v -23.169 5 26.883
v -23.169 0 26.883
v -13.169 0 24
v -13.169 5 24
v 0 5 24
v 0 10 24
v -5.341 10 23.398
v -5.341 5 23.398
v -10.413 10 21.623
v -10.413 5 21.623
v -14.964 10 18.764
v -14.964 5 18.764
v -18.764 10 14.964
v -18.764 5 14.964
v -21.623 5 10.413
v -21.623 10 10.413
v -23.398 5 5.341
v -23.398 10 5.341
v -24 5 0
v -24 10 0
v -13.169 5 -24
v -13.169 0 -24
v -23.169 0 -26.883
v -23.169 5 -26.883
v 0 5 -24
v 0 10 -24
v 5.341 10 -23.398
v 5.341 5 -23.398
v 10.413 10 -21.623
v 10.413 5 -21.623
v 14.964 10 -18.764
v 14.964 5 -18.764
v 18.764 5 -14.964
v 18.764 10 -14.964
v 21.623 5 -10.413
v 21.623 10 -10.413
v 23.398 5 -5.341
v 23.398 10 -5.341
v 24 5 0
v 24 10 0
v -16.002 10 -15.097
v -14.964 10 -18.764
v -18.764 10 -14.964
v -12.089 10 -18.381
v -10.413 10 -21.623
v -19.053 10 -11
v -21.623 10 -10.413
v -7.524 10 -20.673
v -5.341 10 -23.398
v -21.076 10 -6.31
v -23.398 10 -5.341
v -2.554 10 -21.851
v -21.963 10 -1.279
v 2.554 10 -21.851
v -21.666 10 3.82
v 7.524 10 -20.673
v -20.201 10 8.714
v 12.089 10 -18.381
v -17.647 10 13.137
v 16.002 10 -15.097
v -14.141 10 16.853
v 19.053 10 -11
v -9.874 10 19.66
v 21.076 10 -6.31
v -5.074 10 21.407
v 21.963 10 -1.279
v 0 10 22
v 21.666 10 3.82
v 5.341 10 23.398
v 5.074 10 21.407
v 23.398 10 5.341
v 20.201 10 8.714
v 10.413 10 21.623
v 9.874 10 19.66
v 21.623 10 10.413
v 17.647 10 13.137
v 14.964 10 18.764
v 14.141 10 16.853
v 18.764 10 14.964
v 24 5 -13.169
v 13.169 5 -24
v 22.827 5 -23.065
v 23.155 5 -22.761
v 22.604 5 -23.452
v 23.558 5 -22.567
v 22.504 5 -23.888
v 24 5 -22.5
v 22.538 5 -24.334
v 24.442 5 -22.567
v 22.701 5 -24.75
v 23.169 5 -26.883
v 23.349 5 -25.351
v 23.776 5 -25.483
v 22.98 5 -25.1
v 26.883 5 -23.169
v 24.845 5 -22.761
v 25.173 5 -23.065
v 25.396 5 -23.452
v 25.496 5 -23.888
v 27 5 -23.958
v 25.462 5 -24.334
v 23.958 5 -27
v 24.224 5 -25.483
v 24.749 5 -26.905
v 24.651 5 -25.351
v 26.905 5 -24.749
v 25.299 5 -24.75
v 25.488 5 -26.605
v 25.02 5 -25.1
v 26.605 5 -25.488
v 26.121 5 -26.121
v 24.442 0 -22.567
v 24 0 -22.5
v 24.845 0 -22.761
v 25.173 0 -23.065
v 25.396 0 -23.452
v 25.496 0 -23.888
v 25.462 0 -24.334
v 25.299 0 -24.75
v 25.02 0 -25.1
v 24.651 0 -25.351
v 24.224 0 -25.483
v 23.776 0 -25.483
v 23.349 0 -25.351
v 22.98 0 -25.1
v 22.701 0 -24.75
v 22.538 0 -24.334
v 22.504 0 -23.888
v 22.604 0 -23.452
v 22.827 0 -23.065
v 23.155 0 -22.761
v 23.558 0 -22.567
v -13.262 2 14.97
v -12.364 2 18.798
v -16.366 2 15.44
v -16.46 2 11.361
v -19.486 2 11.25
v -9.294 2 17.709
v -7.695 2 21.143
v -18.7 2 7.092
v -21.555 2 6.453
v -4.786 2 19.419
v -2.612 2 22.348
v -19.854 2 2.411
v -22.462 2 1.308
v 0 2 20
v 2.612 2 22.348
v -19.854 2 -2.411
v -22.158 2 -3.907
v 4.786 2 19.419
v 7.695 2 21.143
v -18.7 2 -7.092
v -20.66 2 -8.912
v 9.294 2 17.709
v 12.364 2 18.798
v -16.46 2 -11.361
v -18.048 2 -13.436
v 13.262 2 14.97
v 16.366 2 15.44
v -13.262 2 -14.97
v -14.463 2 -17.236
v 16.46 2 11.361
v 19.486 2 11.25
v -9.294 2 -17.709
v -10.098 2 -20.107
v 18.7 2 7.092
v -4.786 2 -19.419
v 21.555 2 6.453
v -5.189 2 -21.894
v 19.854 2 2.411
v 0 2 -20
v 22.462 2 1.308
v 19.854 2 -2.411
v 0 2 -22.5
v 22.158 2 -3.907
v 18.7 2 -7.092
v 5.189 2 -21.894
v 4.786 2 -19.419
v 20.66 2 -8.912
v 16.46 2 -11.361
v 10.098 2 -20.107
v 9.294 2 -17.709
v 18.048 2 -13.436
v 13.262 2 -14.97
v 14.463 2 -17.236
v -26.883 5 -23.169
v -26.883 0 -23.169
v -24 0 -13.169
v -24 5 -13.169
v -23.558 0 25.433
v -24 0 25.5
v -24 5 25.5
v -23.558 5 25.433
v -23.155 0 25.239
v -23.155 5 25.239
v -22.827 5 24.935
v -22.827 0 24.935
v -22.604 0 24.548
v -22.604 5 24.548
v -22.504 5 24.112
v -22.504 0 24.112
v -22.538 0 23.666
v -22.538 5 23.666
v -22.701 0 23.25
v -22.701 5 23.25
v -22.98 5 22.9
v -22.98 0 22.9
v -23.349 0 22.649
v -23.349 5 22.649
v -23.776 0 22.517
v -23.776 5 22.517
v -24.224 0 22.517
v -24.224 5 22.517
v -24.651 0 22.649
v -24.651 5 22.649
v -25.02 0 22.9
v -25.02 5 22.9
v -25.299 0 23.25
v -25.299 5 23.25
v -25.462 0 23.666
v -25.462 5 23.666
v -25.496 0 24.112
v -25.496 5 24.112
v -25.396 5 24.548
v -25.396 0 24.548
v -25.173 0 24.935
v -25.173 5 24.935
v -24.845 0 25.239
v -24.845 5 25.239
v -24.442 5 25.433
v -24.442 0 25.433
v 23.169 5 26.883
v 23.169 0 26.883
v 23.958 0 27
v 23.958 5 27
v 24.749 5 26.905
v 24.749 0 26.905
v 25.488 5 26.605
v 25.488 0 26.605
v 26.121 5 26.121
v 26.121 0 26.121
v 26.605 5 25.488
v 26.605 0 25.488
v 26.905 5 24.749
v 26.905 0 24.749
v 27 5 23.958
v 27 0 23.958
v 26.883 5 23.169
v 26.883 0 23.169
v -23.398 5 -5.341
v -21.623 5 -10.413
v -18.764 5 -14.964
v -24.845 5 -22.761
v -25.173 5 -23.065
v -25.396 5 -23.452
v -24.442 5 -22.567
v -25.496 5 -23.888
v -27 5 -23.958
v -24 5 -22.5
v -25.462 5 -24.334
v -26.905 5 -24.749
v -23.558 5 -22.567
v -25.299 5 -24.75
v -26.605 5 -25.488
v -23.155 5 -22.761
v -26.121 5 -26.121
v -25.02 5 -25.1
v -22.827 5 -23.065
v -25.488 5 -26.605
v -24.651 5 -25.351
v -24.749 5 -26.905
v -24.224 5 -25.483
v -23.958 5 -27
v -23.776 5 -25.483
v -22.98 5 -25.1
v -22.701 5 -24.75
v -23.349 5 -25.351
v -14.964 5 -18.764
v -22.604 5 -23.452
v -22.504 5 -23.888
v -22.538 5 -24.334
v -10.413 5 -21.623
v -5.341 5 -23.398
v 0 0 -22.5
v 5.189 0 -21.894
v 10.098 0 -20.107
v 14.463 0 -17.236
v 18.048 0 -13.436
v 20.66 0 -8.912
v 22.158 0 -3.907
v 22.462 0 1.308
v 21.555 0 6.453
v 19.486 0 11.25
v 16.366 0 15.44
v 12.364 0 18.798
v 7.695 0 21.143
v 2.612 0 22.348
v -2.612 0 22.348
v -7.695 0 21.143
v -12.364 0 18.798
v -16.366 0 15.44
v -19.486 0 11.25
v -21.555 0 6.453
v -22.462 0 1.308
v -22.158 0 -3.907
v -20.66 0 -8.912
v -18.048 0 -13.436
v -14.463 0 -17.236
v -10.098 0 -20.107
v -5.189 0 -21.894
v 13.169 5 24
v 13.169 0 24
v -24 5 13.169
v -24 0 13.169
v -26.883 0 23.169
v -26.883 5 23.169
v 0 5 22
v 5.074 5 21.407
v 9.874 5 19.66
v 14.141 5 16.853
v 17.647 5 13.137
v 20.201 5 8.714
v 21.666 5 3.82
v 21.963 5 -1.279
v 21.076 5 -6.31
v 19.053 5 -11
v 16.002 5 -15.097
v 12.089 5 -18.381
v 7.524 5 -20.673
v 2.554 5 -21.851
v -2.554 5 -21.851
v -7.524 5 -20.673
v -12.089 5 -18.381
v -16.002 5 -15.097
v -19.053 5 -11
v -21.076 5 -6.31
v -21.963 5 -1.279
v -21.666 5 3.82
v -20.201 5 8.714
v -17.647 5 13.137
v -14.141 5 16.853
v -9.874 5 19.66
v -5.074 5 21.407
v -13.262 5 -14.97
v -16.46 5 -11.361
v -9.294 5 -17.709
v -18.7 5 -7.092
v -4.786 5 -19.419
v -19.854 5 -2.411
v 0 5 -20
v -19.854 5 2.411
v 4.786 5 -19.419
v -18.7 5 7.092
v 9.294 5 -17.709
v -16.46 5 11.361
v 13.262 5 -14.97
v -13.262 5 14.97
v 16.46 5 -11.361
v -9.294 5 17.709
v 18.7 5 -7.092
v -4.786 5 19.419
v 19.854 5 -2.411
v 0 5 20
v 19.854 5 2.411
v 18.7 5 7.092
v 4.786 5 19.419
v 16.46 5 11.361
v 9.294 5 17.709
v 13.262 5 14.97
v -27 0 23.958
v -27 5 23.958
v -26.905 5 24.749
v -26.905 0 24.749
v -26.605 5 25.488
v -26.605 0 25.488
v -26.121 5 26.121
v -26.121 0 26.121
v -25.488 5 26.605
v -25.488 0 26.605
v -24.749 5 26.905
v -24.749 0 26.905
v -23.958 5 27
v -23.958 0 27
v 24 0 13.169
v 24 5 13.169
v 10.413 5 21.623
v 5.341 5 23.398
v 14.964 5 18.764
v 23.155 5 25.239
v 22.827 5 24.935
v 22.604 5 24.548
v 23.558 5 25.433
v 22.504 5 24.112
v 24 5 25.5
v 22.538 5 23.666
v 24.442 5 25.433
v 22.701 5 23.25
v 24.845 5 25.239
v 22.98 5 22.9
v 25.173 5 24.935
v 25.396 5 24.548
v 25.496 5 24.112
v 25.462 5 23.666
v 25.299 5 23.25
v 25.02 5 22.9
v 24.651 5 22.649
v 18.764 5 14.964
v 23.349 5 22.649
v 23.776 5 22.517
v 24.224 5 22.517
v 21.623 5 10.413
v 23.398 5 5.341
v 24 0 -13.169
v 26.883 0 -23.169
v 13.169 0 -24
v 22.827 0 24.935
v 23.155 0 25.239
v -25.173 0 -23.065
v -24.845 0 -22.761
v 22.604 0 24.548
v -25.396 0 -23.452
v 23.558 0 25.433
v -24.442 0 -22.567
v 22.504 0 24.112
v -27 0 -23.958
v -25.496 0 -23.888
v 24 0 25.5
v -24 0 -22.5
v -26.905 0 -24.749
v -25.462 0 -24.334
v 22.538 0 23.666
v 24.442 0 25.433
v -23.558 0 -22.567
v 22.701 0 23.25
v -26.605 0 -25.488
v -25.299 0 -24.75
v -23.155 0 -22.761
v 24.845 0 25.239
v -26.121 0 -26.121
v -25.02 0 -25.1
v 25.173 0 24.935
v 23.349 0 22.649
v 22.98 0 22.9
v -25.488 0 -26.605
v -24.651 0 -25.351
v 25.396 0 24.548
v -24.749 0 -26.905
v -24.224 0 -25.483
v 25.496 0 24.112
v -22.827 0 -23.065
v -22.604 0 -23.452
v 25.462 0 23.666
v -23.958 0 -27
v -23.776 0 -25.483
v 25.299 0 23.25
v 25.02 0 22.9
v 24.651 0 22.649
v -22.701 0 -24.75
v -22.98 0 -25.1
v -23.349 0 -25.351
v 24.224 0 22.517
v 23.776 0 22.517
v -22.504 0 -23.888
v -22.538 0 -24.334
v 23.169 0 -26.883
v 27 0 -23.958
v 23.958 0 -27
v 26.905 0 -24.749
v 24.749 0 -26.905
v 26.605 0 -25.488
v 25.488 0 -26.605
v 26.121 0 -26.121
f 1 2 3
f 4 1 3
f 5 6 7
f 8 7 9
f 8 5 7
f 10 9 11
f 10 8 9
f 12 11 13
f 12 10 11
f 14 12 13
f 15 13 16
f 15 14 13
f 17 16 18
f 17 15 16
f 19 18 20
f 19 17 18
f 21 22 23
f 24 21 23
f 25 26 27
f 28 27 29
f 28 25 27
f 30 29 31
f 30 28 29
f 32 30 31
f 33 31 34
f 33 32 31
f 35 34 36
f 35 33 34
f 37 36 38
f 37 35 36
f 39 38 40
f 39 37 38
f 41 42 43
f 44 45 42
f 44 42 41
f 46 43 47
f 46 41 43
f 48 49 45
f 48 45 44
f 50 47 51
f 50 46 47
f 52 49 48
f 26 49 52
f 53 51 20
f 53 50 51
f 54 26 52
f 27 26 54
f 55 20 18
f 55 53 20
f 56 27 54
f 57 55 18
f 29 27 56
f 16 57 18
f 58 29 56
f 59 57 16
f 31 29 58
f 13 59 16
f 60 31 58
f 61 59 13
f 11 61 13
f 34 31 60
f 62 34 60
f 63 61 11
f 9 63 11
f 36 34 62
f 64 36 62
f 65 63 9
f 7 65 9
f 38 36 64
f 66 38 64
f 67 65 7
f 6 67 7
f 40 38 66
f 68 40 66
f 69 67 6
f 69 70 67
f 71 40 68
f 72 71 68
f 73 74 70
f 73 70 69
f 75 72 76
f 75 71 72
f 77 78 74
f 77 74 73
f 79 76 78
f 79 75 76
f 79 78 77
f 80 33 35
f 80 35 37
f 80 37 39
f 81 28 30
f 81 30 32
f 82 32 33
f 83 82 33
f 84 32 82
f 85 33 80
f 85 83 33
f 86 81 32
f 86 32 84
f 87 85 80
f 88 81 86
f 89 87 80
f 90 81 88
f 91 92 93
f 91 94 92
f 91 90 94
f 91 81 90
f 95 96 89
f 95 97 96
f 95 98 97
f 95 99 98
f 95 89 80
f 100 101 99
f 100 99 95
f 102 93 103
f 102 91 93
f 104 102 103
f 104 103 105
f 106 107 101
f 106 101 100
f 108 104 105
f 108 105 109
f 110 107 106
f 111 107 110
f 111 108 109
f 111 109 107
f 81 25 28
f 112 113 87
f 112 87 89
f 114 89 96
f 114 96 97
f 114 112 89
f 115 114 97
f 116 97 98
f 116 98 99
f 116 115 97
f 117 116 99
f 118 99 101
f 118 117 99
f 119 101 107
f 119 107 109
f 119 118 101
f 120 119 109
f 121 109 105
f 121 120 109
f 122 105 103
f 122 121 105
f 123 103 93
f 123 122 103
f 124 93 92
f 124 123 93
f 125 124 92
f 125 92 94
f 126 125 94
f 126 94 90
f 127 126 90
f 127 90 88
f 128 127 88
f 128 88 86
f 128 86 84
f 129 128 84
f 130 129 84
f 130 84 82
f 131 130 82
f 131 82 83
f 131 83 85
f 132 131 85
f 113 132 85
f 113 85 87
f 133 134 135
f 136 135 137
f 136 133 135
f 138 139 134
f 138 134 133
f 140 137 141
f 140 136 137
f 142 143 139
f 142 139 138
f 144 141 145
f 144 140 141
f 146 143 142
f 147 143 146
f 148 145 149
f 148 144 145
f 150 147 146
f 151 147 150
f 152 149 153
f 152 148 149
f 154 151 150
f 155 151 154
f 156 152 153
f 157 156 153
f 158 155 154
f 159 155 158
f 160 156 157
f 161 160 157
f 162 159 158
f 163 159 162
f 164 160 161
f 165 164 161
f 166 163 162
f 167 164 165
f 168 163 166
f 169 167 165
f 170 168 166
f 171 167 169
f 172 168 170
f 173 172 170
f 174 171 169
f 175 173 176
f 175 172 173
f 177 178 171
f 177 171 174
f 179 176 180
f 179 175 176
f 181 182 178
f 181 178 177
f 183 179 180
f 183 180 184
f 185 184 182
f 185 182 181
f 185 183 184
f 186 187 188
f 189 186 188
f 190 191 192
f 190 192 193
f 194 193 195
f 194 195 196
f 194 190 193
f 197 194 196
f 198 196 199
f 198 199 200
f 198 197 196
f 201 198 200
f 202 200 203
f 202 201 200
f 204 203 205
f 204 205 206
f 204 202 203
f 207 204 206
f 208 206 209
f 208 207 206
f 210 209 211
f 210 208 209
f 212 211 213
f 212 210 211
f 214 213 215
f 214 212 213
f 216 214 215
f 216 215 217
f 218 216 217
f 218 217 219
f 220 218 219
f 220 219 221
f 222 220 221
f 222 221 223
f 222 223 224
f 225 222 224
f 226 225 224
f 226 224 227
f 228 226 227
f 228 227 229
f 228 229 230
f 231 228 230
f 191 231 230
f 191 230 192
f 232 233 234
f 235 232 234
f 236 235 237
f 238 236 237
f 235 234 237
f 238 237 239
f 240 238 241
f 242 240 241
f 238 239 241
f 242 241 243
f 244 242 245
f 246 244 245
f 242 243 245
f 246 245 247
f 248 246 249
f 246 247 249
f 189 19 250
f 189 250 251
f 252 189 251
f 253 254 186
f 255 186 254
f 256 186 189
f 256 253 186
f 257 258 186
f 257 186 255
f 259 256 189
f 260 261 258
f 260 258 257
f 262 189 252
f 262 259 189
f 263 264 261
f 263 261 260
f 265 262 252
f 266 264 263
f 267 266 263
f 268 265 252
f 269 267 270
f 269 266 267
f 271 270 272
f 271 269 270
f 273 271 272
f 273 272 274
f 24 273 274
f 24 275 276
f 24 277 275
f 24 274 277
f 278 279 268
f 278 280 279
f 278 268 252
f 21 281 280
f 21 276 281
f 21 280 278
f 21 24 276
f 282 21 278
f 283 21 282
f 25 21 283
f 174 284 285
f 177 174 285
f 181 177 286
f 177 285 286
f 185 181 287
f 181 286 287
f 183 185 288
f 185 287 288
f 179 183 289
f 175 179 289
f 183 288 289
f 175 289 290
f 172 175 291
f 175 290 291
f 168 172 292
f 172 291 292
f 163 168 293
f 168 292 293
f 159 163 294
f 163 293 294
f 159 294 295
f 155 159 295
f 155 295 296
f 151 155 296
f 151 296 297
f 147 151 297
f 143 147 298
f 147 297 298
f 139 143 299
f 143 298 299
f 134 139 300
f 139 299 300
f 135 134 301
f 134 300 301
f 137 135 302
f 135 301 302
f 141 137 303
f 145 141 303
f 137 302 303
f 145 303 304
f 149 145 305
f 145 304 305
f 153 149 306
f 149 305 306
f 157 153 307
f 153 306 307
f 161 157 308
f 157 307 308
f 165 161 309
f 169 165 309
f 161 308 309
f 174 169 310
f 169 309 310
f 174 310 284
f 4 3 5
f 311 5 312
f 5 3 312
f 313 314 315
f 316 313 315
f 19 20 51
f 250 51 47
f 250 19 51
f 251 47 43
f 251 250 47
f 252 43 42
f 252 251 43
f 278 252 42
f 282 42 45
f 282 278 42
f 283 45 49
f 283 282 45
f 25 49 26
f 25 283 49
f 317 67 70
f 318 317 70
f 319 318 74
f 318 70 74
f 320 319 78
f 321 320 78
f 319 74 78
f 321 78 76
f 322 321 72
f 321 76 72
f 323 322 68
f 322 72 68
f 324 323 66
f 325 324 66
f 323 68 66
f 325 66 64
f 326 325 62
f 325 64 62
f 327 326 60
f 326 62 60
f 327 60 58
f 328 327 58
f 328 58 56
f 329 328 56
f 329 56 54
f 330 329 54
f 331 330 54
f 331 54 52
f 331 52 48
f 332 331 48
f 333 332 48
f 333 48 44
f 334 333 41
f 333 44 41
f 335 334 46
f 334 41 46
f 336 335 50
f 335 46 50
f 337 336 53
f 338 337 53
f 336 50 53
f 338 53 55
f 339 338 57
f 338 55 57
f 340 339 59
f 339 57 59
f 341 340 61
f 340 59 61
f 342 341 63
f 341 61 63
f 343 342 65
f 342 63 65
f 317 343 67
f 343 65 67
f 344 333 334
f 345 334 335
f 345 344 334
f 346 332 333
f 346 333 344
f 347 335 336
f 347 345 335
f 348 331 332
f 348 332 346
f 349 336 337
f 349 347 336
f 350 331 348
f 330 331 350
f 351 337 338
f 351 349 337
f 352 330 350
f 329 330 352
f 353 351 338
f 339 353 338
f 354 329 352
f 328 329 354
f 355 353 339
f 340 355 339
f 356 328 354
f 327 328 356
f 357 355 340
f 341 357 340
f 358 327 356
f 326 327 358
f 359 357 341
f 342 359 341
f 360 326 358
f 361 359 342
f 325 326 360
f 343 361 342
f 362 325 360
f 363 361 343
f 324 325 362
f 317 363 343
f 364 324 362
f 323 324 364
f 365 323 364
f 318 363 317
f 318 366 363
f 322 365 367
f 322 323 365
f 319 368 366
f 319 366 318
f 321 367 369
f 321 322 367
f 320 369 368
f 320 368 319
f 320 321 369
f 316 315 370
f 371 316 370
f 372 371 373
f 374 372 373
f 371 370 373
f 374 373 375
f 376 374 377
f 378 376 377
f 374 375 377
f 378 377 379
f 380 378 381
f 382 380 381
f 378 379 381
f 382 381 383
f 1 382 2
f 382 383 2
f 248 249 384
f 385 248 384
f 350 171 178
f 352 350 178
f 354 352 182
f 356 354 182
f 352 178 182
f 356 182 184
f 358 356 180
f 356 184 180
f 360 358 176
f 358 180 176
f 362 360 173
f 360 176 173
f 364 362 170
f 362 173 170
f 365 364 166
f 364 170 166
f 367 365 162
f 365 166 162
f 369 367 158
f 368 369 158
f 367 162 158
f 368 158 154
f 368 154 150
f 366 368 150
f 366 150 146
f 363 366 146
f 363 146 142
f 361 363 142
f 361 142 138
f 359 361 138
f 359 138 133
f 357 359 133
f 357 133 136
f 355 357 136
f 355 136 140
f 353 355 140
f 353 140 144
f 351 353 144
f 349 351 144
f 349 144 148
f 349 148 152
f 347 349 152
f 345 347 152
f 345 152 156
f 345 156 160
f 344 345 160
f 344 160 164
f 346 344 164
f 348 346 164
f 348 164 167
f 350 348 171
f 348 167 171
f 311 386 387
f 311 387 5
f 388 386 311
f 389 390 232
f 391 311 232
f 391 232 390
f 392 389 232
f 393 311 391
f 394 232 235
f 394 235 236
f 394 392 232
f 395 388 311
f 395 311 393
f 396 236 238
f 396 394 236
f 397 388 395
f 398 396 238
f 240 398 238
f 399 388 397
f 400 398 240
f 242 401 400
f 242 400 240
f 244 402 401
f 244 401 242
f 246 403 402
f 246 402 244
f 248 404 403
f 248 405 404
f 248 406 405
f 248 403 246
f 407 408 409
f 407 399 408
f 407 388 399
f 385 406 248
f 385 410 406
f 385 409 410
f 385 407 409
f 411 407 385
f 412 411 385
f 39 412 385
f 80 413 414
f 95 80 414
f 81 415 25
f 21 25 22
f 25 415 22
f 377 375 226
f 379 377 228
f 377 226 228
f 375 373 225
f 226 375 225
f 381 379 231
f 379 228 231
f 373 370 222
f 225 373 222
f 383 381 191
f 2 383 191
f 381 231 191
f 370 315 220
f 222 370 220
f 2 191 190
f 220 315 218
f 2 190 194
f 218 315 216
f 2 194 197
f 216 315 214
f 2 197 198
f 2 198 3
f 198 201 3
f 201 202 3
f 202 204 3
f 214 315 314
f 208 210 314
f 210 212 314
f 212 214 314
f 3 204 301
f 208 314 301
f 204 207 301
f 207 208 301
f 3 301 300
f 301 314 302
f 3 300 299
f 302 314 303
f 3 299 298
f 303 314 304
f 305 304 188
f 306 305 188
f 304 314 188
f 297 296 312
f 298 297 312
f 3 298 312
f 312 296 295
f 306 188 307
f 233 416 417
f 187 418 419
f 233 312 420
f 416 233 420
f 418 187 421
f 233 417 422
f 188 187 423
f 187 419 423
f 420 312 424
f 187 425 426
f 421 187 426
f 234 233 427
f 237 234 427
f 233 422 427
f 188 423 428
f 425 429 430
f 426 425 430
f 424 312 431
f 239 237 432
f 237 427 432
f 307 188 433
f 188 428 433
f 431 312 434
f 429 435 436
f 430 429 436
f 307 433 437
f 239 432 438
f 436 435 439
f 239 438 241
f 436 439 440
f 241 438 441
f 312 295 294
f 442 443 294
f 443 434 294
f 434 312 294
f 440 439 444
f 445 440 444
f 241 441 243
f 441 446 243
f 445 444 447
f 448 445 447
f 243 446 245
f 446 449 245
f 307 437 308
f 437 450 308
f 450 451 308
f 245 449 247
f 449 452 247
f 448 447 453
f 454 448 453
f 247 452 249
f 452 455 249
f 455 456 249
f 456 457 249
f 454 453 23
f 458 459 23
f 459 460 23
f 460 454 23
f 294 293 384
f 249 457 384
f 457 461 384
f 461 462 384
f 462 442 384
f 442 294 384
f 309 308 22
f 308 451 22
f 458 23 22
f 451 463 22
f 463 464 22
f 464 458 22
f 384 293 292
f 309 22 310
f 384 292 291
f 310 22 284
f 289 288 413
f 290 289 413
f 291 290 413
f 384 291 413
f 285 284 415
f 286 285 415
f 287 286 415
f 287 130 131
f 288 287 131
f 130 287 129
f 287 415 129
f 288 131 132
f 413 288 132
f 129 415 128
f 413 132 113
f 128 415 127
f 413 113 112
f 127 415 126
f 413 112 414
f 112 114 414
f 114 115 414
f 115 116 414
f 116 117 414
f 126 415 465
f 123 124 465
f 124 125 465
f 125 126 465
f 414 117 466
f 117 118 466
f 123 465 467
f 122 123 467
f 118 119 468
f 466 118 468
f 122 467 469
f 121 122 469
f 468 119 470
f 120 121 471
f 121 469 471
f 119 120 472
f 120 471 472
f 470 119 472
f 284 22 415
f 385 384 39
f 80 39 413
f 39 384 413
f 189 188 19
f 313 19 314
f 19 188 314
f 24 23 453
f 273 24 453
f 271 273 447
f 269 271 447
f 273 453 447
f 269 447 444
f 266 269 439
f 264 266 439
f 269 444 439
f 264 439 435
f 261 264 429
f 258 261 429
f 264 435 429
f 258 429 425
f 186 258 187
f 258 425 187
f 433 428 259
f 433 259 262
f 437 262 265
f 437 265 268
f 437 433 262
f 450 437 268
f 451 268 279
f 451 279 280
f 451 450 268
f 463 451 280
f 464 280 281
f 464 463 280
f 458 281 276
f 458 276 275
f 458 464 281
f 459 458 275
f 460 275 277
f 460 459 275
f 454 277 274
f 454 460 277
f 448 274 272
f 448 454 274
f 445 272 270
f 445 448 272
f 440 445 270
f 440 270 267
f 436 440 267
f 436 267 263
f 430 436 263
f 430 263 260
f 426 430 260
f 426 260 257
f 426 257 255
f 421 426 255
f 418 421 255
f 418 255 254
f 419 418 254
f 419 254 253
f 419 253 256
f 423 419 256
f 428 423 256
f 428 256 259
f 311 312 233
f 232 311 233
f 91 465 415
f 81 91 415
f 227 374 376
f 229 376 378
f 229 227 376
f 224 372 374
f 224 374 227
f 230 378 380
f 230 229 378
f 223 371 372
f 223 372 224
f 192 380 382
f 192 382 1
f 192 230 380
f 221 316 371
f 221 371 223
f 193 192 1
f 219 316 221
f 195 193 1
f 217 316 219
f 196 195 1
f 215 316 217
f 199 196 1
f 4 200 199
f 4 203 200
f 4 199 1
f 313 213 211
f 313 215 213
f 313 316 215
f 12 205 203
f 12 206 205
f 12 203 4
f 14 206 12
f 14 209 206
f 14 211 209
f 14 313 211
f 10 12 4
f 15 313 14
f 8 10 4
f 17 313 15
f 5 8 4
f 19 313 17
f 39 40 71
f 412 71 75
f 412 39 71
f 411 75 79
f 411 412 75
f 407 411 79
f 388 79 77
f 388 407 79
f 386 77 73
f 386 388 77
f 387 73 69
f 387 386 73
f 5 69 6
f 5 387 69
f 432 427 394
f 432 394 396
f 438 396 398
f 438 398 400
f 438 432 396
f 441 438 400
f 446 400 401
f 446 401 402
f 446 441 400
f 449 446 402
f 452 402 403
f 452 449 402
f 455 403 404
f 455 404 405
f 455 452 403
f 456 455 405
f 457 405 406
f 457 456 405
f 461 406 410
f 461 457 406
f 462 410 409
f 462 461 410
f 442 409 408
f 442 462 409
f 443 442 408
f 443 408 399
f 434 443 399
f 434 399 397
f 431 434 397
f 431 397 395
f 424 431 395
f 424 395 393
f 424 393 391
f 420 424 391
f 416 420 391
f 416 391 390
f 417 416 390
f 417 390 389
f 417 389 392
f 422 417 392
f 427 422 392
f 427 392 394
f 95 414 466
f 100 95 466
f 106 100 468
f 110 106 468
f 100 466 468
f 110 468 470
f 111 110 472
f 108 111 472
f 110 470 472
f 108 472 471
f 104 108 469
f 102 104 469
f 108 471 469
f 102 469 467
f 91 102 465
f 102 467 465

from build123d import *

# Parameters (mm, degrees)
SKETCH1_R           = 1.5
BOSS_EXTRUDE1_DEPTH = 25
SKETCH2_R           = 20
CUT_EXTRUDE1_DEPTH  = 23
CUT_EXTRUDE2_START  = -20
SKETCH3_R           = 1.5
CUT_EXTRUDE2_DEPTH  = 20
FILLET2_R           = 3
SKETCH4_R           = 22.5
SKETCH4_R_2         = 20
CUT_EXTRUDE3_DEPTH  = 2
CUT_EXTRUDE4_START  = -15
SKETCH5_R           = 24
CUT_EXTRUDE4_DEPTH  = 15
SKETCH6_R           = 22
CUT_EXTRUDE5_DEPTH  = 5


with BuildPart() as part:
    # Sketch1 → Boss-Extrude1 (new body)
    with BuildSketch(Plane(origin=(0, 0, 0), x_dir=(1, 0, 0), z_dir=(0, 1, 0))):
        with BuildLine():
            Line((13.169048105, 24), (-13.169048105, 24))
            Line((-13.169048105, 24), (-23.169048105, 26.882623622))
            ThreePointArc((-23.169048105, 26.882623622), (-26.121320344, 26.121320344), (-26.882623622, 23.169048105))
            Line((-26.882623622, 23.169048105), (-24, 13.169048105))
            Line((-24, 13.169048105), (-24, -13.169048105))
            Line((-24, -13.169048105), (-26.882623622, -23.169048105))
            ThreePointArc((-26.882623622, -23.169048105), (-26.121320344, -26.121320344), (-23.169048105, -26.882623622))
            Line((-23.169048105, -26.882623622), (-13.169048105, -24))
            Line((-13.169048105, -24), (13.169048105, -24))
            Line((13.169048105, -24), (23.169048105, -26.882623622))
            ThreePointArc((23.169048105, -26.882623622), (26.121320344, -26.121320344), (26.882623622, -23.169048105))
            Line((26.882623622, -23.169048105), (24, -13.169048105))
            Line((24, -13.169048105), (24, 13.169048105))
            Line((24, 13.169048105), (26.882623622, 23.169048105))
            ThreePointArc((26.882623622, 23.169048105), (26.121320344, 26.121320344), (23.169048105, 26.882623622))
            Line((23.169048105, 26.882623622), (13.169048105, 24))
        make_face()
        with Locations(Location((24, 24, 0), (0, 0, 270))):
            Circle(SKETCH1_R, mode=Mode.SUBTRACT)
        with Locations(Location((-24, -24, 0), (0, 0, 270))):
            Circle(SKETCH1_R, mode=Mode.SUBTRACT)
        with Locations(Location((24, -24, 0), (0, 0, 270))):
            Circle(SKETCH1_R, mode=Mode.SUBTRACT)
        with Locations(Location((-24, 24, 0), (0, 0, 270))):
            Circle(SKETCH1_R, mode=Mode.SUBTRACT)
    extrude(amount=BOSS_EXTRUDE1_DEPTH)

    # Sketch2 → Cut-Extrude1 (cut)
    with BuildSketch(Plane.XZ):
        with Locations(Location((0, 0, 0), (0, 0, 270))):
            Circle(SKETCH2_R)
    extrude(amount=-CUT_EXTRUDE1_DEPTH, mode=Mode.SUBTRACT)

    # Sketch3 → Cut-Extrude2 (cut)
    # profile 1 of 4: a face of its own
    with BuildSketch(Plane(origin=(0, 25, 0), x_dir=(1, 0, 0), z_dir=(0, 1, 0)).offset(CUT_EXTRUDE2_START)):
        with BuildLine():
            ThreePointArc((-24, 0), (-16.970562748, 16.970562748), (0, 24))
            Line((0, 24), (-13.169048105, 24))
            Line((-13.169048105, 24), (-23.169048105, 26.882623622))
            ThreePointArc((-23.169048105, 26.882623622), (-26.121320344, 26.121320344), (-26.882623622, 23.169048105))
            Line((-26.882623622, 23.169048105), (-24, 13.169048105))
            Line((-24, 13.169048105), (-24, 0))
        make_face()
        with Locations(Location((-24, 24, 0), (0, 0, 270))):
            Circle(SKETCH3_R, mode=Mode.SUBTRACT)
    # profile 2 of 4: a face of its own
    with BuildSketch(Plane(origin=(0, 25, 0), x_dir=(1, 0, 0), z_dir=(0, 1, 0)).offset(CUT_EXTRUDE2_START)):
        with BuildLine():
            Line((-13.169048105, -24), (0, -24))
            ThreePointArc((0, -24), (-16.970562748, -16.970562748), (-24, 0))
            Line((-24, 0), (-24, -13.169048105))
            Line((-24, -13.169048105), (-26.882623622, -23.169048105))
            ThreePointArc((-26.882623622, -23.169048105), (-26.121320344, -26.121320344), (-23.169048105, -26.882623622))
            Line((-23.169048105, -26.882623622), (-13.169048105, -24))
        make_face()
        with Locations(Location((-24, -24, 0), (0, 0, 270))):
            Circle(SKETCH3_R, mode=Mode.SUBTRACT)
    # profile 3 of 4: a face of its own
    with BuildSketch(Plane(origin=(0, 25, 0), x_dir=(1, 0, 0), z_dir=(0, 1, 0)).offset(CUT_EXTRUDE2_START)):
        with BuildLine():
            Line((24, -13.169048105), (24, 0))
            ThreePointArc((24, 0), (16.970562748, -16.970562748), (0, -24))
            Line((0, -24), (13.169048105, -24))
            Line((13.169048105, -24), (23.169048105, -26.882623622))
            ThreePointArc((23.169048105, -26.882623622), (26.121320344, -26.121320344), (26.882623622, -23.169048105))
            Line((26.882623622, -23.169048105), (24, -13.169048105))
        make_face()
        with Locations(Location((24, -24, 0), (0, 0, 270))):
            Circle(SKETCH3_R, mode=Mode.SUBTRACT)
    # profile 4 of 4: a face of its own
    with BuildSketch(Plane(origin=(0, 25, 0), x_dir=(1, 0, 0), z_dir=(0, 1, 0)).offset(CUT_EXTRUDE2_START)):
        with BuildLine():
            Line((24, 0), (24, 13.169048105))
            Line((24, 13.169048105), (26.882623622, 23.169048105))
            ThreePointArc((26.882623622, 23.169048105), (26.121320344, 26.121320344), (23.169048105, 26.882623622))
            Line((23.169048105, 26.882623622), (13.169048105, 24))
            Line((13.169048105, 24), (0, 24))
            ThreePointArc((0, 24), (16.970562748, 16.970562748), (24, 0))
        make_face()
        with Locations(Location((24, 24, 0), (0, 0, 270))):
            Circle(SKETCH3_R, mode=Mode.SUBTRACT)
    extrude(amount=CUT_EXTRUDE2_DEPTH, mode=Mode.SUBTRACT)

    # Fillet2
    fillet2_edges = [part.edges().sort_by_distance(p)[0] for p in [
        (0, 23, 20),
    ]]
    fillet(fillet2_edges, radius=FILLET2_R)

    # Sketch4 → Cut-Extrude3 (cut)
    with BuildSketch(Plane.XZ):
        with Locations(Location((0, 0, 0), (0, 0, 270))):
            Circle(SKETCH4_R)
        with Locations(Location((0, 0, 0), (0, 0, 270))):
            Circle(SKETCH4_R_2, mode=Mode.SUBTRACT)
    extrude(amount=-CUT_EXTRUDE3_DEPTH, mode=Mode.SUBTRACT)

    # Sketch5 → Cut-Extrude4 (cut)
    with BuildSketch(Plane(origin=(0, 25, 0), x_dir=(1, 0, 0), z_dir=(0, 1, 0)).offset(CUT_EXTRUDE4_START)):
        with Locations(Location((0, 0, 0), (0, 0, 270))):
            Circle(SKETCH5_R)
    extrude(amount=CUT_EXTRUDE4_DEPTH, mode=Mode.SUBTRACT)

    # Sketch6 → Cut-Extrude5 (cut)
    with BuildSketch(Plane(origin=(0, 10, 0), x_dir=(1, 0, 0), z_dir=(0, 1, 0))):
        with Locations(Location((0, 0, 0), (0, 0, 270))):
            Circle(SKETCH6_R)
    extrude(amount=-CUT_EXTRUDE5_DEPTH, mode=Mode.SUBTRACT)


solid = part.part
